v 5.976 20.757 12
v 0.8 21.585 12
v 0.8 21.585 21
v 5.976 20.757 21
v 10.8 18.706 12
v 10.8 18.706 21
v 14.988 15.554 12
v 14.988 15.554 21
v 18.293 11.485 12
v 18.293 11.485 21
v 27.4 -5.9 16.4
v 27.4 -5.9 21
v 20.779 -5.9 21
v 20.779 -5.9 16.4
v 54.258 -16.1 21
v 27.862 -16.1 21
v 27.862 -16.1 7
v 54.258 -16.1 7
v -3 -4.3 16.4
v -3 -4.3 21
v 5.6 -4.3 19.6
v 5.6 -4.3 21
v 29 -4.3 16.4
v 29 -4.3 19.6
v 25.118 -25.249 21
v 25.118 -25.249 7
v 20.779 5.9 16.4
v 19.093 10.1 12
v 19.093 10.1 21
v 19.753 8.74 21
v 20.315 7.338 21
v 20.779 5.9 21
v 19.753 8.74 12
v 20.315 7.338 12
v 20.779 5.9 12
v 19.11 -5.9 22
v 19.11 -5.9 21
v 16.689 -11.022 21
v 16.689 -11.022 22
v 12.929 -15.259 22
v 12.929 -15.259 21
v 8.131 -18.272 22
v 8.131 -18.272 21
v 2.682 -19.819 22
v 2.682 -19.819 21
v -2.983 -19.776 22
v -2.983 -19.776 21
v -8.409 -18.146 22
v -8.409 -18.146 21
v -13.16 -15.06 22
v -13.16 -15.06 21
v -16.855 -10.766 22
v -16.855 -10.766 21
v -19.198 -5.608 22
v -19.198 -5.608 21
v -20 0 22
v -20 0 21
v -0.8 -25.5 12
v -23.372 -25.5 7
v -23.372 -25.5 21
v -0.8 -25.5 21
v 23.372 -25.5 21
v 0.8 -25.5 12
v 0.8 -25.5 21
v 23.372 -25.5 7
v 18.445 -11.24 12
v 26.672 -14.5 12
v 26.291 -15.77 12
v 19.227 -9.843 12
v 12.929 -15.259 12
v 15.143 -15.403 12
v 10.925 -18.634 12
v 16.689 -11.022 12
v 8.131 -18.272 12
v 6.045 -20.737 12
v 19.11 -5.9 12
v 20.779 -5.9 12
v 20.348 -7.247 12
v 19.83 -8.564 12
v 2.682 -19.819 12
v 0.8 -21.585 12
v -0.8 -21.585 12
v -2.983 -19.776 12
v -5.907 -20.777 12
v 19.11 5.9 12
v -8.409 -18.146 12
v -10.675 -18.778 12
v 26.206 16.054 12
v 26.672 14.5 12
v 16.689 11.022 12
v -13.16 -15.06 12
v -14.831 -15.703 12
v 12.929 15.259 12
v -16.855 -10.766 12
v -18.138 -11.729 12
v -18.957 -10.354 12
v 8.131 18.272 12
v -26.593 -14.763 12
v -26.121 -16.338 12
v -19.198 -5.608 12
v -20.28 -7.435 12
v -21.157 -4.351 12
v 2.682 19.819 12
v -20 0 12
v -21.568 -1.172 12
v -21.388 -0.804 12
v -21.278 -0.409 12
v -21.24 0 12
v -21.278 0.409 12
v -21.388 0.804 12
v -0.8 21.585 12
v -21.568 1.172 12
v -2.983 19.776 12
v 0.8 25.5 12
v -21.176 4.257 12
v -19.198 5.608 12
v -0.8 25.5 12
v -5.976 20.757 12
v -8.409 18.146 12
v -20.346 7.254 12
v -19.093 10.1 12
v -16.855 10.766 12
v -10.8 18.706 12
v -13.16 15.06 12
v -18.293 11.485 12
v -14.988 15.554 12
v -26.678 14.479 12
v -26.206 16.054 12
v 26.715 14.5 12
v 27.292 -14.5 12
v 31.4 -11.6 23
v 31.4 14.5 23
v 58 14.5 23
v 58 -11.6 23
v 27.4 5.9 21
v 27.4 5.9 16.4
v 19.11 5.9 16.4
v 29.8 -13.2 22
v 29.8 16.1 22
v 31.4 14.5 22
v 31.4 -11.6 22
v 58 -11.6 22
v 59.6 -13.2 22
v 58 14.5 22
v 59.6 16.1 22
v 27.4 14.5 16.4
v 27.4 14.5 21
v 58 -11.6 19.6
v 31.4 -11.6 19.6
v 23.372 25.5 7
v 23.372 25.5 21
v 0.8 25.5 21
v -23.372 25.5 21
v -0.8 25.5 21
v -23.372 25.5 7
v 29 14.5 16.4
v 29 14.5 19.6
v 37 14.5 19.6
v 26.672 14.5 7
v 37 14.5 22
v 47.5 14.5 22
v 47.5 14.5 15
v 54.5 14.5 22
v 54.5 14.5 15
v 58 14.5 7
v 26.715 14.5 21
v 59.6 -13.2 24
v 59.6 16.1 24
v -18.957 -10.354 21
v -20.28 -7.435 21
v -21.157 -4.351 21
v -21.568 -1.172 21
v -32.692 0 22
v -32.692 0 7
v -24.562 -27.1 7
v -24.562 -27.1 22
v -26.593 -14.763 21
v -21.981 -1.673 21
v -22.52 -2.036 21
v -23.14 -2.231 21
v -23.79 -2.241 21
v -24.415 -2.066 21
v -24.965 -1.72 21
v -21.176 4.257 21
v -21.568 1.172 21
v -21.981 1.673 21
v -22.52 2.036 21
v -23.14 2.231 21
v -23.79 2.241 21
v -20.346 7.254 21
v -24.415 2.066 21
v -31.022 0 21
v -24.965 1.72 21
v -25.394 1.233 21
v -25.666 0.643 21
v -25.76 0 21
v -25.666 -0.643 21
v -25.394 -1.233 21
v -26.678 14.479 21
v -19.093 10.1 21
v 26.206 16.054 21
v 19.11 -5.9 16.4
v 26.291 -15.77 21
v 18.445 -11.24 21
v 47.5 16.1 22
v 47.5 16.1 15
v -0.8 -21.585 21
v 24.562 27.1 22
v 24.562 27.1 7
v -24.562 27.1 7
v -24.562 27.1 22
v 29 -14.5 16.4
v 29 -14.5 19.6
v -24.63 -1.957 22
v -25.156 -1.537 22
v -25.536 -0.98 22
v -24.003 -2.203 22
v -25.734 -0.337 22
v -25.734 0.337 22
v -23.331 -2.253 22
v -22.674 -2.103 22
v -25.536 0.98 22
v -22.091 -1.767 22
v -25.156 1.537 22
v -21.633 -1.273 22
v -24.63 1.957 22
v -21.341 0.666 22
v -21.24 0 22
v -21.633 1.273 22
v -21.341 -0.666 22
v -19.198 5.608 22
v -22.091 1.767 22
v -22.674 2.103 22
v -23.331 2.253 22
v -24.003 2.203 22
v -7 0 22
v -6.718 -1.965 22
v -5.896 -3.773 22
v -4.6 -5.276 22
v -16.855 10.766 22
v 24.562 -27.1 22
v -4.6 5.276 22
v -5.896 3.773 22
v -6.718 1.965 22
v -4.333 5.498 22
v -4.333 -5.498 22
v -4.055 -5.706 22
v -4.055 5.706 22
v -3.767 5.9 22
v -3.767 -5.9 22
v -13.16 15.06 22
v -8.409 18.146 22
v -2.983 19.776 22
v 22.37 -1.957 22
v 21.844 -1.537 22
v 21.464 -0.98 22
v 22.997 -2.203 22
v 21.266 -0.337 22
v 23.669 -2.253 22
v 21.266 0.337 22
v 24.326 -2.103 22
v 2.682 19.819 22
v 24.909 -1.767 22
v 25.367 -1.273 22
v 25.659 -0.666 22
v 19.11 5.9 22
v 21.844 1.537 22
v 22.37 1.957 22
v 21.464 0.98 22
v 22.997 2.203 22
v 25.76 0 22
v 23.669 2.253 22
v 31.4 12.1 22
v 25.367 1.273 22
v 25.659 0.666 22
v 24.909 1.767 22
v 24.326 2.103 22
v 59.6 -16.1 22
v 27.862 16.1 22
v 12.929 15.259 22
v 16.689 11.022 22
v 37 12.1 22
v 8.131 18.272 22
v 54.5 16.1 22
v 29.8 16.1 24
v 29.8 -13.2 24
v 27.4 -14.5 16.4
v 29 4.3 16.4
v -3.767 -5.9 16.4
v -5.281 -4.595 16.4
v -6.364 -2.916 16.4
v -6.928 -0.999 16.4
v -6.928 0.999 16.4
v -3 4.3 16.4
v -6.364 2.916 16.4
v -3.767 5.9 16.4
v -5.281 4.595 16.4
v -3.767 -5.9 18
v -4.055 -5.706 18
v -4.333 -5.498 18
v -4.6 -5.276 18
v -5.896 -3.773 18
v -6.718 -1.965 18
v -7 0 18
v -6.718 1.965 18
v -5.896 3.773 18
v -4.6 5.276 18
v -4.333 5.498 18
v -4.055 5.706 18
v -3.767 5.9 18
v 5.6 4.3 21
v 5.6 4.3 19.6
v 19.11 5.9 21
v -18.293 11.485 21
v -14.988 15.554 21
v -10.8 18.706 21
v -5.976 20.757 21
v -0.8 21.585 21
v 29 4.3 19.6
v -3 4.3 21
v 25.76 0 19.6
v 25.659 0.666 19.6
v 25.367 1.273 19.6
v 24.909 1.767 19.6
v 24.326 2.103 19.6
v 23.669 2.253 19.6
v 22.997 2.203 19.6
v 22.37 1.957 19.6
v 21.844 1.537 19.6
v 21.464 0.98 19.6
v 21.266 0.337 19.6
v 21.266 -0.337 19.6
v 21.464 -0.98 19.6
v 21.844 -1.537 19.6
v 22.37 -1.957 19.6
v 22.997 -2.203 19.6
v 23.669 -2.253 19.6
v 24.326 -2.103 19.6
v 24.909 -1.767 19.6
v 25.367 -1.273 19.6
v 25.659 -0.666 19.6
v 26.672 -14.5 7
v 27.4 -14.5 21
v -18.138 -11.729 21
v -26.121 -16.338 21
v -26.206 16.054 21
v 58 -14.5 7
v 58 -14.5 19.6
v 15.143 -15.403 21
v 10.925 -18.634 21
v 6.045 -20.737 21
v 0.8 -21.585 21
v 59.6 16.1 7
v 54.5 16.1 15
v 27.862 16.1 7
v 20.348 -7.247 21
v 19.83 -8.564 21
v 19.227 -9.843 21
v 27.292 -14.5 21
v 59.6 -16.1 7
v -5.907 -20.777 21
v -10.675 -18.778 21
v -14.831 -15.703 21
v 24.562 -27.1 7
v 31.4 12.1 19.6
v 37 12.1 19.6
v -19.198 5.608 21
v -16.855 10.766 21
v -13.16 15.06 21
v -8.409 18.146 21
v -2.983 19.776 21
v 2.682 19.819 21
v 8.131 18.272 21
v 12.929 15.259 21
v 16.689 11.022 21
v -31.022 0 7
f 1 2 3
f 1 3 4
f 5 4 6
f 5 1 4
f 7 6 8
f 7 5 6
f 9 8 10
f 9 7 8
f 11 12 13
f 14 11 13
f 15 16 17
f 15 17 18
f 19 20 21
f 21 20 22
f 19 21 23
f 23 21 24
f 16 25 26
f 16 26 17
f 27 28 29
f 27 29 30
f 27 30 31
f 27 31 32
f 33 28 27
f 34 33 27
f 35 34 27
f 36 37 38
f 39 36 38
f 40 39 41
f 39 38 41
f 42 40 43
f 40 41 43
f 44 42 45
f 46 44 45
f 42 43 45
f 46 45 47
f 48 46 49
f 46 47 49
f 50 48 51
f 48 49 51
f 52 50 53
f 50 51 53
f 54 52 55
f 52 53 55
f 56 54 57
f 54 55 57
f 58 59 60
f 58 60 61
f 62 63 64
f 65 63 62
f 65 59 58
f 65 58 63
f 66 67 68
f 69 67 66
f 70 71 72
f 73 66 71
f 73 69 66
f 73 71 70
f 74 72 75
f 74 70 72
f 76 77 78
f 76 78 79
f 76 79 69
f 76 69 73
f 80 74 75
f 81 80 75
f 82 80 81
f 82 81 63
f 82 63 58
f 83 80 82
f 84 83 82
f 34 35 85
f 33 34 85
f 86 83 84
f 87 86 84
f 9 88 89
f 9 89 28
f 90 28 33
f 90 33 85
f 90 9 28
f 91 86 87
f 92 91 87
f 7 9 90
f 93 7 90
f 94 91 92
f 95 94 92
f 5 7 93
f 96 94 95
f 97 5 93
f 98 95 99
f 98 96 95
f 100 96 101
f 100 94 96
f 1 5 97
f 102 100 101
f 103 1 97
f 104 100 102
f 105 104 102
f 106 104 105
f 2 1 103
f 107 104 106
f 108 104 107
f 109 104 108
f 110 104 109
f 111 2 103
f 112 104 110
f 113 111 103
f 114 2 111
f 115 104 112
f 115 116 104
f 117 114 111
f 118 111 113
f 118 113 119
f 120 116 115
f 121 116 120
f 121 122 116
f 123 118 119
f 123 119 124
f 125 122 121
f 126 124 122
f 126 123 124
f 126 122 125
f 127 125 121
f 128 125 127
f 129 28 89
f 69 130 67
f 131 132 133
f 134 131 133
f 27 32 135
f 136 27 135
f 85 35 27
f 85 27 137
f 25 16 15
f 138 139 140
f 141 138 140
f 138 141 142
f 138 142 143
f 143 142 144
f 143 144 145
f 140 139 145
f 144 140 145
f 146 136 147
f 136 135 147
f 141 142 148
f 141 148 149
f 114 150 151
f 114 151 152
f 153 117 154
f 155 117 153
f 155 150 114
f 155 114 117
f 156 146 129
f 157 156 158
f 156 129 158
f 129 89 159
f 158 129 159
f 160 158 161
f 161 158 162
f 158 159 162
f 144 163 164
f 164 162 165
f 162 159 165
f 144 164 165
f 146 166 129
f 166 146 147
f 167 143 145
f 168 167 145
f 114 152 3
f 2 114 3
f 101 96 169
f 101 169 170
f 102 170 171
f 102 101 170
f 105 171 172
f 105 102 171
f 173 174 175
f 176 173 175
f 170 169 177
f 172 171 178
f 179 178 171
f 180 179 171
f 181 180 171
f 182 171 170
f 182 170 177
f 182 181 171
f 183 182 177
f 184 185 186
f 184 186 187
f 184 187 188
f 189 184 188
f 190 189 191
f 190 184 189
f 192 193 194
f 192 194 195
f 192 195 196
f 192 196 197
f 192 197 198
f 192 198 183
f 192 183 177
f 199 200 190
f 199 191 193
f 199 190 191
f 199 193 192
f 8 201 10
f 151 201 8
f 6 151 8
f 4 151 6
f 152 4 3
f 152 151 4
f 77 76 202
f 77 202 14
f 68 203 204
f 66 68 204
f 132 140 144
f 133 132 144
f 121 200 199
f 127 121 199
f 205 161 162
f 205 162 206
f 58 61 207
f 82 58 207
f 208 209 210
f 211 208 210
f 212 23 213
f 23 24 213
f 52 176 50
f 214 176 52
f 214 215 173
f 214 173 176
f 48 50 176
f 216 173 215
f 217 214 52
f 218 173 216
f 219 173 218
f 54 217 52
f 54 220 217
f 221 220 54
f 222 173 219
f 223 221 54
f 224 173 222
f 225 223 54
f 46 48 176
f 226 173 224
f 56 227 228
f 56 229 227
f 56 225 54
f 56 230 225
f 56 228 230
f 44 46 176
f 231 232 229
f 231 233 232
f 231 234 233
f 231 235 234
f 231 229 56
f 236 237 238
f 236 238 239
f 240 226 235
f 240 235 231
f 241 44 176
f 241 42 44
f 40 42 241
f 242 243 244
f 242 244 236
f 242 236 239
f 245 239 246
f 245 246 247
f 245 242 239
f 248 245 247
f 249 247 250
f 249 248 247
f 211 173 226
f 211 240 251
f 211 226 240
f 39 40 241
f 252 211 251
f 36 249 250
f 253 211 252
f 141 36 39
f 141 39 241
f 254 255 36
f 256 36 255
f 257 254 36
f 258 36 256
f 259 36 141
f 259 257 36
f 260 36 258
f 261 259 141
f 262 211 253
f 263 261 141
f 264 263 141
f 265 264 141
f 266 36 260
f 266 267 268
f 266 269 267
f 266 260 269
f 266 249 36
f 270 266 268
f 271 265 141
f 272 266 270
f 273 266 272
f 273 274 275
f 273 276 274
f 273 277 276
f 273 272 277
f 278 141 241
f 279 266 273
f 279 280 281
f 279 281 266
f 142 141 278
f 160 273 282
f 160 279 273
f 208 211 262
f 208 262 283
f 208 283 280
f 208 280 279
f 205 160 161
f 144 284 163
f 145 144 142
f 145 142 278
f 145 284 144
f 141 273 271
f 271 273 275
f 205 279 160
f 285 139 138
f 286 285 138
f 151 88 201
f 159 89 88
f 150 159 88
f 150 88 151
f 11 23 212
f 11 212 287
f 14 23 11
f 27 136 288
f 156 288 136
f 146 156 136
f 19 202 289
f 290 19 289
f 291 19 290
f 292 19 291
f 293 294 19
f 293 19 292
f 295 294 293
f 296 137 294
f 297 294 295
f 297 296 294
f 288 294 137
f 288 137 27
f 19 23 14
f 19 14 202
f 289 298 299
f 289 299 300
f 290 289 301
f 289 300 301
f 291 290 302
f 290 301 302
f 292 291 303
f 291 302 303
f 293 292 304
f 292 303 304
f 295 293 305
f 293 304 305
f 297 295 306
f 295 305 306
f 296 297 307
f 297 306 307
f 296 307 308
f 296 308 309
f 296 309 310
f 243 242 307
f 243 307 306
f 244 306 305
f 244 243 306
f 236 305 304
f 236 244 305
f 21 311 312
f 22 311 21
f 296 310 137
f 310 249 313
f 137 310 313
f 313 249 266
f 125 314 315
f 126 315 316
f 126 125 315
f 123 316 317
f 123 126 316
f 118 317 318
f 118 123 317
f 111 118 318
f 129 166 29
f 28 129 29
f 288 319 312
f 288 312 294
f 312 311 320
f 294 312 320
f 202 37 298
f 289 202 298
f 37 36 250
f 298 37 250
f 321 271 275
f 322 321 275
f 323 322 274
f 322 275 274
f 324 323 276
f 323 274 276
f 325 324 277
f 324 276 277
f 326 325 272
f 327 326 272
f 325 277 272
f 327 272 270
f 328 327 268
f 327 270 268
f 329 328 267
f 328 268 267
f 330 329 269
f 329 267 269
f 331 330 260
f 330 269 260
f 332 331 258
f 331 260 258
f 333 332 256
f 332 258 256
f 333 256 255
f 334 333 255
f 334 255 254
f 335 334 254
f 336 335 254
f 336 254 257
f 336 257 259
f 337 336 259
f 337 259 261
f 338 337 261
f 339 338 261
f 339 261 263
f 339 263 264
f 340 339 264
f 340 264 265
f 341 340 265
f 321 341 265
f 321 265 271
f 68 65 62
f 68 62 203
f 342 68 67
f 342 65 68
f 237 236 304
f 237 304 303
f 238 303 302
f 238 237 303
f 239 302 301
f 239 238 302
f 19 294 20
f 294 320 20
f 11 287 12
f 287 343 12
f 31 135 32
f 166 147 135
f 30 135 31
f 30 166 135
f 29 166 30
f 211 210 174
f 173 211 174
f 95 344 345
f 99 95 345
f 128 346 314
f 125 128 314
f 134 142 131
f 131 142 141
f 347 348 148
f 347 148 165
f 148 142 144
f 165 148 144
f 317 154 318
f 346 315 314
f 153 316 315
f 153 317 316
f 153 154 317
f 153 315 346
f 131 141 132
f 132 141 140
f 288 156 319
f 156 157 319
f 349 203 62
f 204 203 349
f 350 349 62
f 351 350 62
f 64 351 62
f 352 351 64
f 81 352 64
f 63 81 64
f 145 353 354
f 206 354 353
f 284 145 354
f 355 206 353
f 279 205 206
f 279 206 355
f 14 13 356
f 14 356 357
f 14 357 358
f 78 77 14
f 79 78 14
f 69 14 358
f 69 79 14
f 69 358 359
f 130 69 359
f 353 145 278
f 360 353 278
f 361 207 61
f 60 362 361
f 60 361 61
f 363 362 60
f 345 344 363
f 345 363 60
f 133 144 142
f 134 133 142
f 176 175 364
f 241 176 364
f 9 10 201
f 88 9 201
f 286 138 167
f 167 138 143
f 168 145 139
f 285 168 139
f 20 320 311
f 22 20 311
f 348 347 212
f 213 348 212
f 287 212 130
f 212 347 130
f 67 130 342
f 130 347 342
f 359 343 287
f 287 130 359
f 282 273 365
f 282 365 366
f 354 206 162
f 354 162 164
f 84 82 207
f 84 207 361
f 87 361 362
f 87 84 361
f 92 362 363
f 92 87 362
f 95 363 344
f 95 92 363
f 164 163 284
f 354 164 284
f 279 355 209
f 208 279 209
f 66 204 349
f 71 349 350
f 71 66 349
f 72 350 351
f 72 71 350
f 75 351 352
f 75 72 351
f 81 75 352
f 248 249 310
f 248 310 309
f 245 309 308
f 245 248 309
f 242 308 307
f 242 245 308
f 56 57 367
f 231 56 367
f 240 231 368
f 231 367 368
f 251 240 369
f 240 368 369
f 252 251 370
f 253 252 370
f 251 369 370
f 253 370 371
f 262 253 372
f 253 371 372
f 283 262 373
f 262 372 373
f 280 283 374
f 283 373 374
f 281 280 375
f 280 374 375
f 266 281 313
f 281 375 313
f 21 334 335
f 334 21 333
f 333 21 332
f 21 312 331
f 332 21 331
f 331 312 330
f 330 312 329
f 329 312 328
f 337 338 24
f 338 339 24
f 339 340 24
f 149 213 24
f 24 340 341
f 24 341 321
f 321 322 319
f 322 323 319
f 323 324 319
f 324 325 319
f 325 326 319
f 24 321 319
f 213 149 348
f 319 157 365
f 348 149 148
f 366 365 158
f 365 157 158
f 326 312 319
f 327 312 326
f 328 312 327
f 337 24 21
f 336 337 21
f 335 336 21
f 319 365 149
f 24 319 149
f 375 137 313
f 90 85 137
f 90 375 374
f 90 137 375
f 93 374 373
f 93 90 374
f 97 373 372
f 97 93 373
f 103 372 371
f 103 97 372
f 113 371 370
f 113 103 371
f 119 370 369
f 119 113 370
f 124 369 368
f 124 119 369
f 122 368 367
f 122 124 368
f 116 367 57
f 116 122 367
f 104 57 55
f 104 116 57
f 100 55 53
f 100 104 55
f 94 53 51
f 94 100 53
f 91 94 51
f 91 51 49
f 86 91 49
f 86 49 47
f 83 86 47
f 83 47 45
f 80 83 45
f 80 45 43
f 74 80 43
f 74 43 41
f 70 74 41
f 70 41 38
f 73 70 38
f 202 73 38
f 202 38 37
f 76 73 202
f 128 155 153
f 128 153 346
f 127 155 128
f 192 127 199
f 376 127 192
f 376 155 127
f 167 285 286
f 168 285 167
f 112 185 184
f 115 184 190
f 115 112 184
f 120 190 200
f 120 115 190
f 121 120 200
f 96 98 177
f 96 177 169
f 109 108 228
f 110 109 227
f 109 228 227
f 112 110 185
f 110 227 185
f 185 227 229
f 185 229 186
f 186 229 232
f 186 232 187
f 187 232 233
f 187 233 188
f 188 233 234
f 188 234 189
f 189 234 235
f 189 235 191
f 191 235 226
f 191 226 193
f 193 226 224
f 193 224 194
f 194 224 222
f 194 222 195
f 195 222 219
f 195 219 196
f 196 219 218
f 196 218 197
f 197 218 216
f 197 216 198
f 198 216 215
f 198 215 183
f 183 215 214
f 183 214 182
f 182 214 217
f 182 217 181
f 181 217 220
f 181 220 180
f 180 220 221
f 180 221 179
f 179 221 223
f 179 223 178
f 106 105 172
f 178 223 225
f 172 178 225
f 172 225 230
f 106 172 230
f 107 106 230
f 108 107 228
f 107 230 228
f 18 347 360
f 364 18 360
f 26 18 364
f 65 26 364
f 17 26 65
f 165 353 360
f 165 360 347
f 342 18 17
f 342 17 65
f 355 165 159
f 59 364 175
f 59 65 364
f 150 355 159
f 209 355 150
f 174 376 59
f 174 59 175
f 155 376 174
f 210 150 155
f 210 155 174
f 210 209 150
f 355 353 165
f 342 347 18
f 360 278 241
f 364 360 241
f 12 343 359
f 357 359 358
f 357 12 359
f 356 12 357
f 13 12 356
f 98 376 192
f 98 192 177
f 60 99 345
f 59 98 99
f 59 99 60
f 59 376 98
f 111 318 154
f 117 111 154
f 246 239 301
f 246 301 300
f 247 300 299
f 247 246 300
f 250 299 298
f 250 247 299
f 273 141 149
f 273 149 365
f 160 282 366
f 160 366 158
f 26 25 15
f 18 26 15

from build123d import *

# Parameters (mm, degrees)
BOSS_EXTRUDE1_DEPTH      = 10
BOSS_EXTRUDE1_DEPTH_BACK = 5
BOSS_EXTRUDE2_DEPTH      = 15
CUT_EXTRUDE1_DEPTH       = 68.168221653
BOSS_EXTRUDE3_DEPTH      = 4
SKETCH7_R                = 1.75
BOSS_EXTRUDE4_DEPTH      = 2.4
SKETCH8_R                = 3.5
BOSS_EXTRUDE5_DEPTH      = 1
CUT_EXTRUDE2_DEPTH       = 10
BOSS_EXTRUDE7_START      = 14
BOSS_EXTRUDE7_DEPTH      = 14
RIB9_START               = -9
RIB9_DEPTH               = 9
CUT_EXTRUDE3_DEPTH       = 5
SKETCH18_R               = 2.259673145
CUT_EXTRUDE4_DEPTH       = 68.168221653
SKETCH20_R               = 3.5
SKETCH20_W               = 8.6
SKETCH20_H               = 8.6
BOSS_EXTRUDE8_DEPTH      = 1
SKETCH21_W               = 7
SKETCH21_H               = 1.6
CUT_EXTRUDE5_DEPTH       = 7
BOSS_EXTRUDE9_DEPTH      = 1
BOSS_EXTRUDE10_DEPTH     = 14
BOSS_EXTRUDE11_DEPTH     = 2
SKETCH25_W               = 26.6
SKETCH25_H               = 26.1
BOSS_EXTRUDE12_DEPTH     = 1
BOSS_EXTRUDE13_DEPTH     = 4
CUT_EXTRUDE6_START       = -4
CUT_EXTRUDE6_DEPTH       = 4
BOSS_EXTRUDE14_DEPTH     = 1.6


# Read off the part's stored shape, not the designer's step: Rib9
with BuildPart() as part:
    # Sketch2 → Boss-Extrude1 (new, two sides: drawn at the far end of the back side and taken through both)
    with BuildSketch(Plane.XY.offset(12).offset(-BOSS_EXTRUDE1_DEPTH_BACK)):
        Polygon((-24.562464367, 27.1), (-32.692464367, 0), (-24.562464367, -27.1), (24.562464367, -27.1), (32.692464367, 0), (24.562464367, 27.1), align=None)
        Polygon((-23.372015325, 25.5), (-31.022015325, 0), (-23.372015325, -25.5), (23.372015325, -25.5), (31.022015325, 0), (23.372015325, 25.5), align=None, mode=Mode.SUBTRACT)
    extrude(amount=BOSS_EXTRUDE1_DEPTH + BOSS_EXTRUDE1_DEPTH_BACK)

    # Sketch3 → Boss-Extrude2 (add)
    with BuildSketch(Plane.XY.offset(22)):
        Polygon((29.5, 16.1), (59.6, 16.1), (59.6, -16.1), (29.5, -16.1), (27.862464367, -16.1), (28.342464367, -14.5), (29.5, -14.5), (58, -14.5), (58, 14.5), (29.5, 14.5), (28.342464367, 14.5), (27.862464367, 16.1), align=None)
    extrude(amount=-BOSS_EXTRUDE2_DEPTH)

    # Sketch4 → Cut-Extrude1 (cut, through all)
    with BuildSketch(Plane(origin=(0, 0, 7), x_dir=(-1, 0, 0), z_dir=(0, 0, -1))):
        Polygon((-26.672015325, 14.5), (-28.342464367, 14.5), (-32.692464367, 0), (-28.342464367, -14.5), (-26.672015325, -14.5), (-31.022015325, 0), align=None)
    extrude(amount=-CUT_EXTRUDE1_DEPTH, mode=Mode.SUBTRACT)

    # Sketch5 → Boss-Extrude3 (add)
    with BuildSketch(Plane.XY.offset(22)):
        Polygon((29, 4.3), (29, 14), (29, 14.5), (27.4, 14.5), (27.4, 14), (27.4, 5.9), (-4.6, 5.9), (-4.6, -5.9), (27.4, -5.9), (27.4, -14), (27.4, -14.5), (29, -14.5), (29, -14), (29, -4.3), (-3, -4.3), (-3, 4.3), align=None)
    extrude(amount=-BOSS_EXTRUDE3_DEPTH)

    # Sketch7 → Boss-Extrude4 (add)
    with BuildSketch(Plane.XY.offset(22)):
        Polygon((37, 12.1), (37, 14.5), (29, 14.5), (29, 4.3), (5.6, 4.3), (5.6, -4.3), (29, -4.3), (29, -14.5), (58, -14.5), (58, -11.6), (31.4, -11.6), (31.4, 12.1), align=None)
        with Locations((23.5, 0)):
            Circle(SKETCH7_R, mode=Mode.SUBTRACT)
    extrude(amount=-BOSS_EXTRUDE4_DEPTH)

    # Sketch8 → Boss-Extrude5 (add)
    with BuildSketch(Plane.XY.offset(22)):
        Polygon((27.4, -5.9), (27.4, -14.5), (26.672015325, -14.5), (23.372015325, -25.5), (-23.372015325, -25.5), (-31.022015325, 0), (-23.372015325, 25.5), (23.372015325, 25.5), (26.672015325, 14.5), (27.4, 14.5), (27.4, 5.9), (-4.6, 5.9), (-4.6, -5.9), align=None)
        with Locations((-18.25, 18.25)):
            Circle(SKETCH8_R, mode=Mode.SUBTRACT)
        with Locations((18.25, 18.25)):
            Circle(SKETCH8_R, mode=Mode.SUBTRACT)
        with Locations((18.25, -18.25)):
            Circle(SKETCH8_R, mode=Mode.SUBTRACT)
        with Locations((-18.25, -18.25)):
            Circle(SKETCH8_R, mode=Mode.SUBTRACT)
    extrude(amount=-BOSS_EXTRUDE5_DEPTH)

    # Sketch11 → Cut-Extrude2 (cut)
    with BuildSketch(Plane(origin=(0, 0, 21), x_dir=(-1, 0, 0), z_dir=(0, 0, -1))):
        with BuildLine():
            Line((4.6, -5.9), (-19.109945055, -5.9))
            ThreePointArc((-19.109945055, -5.9), (2.983378865, -19.776234489), (20, 0))
            ThreePointArc((20, 0), (2.983378865, 19.776234489), (-19.109945055, 5.9))
            Line((-19.109945055, 5.9), (4.6, 5.9))
            Line((4.6, 5.9), (4.6, -5.9))
        make_face()
    extrude(amount=-CUT_EXTRUDE2_DEPTH, mode=Mode.SUBTRACT)

    # Sketch12 → Boss-Extrude7 (add)
    with BuildSketch(Plane(origin=(0, 0, 21), x_dir=(-1, 0, 0), z_dir=(0, 0, -1)).offset(BOSS_EXTRUDE7_START)):
        with BuildLine():
            ThreePointArc((21.6, 0), (2.978452055, 21.393663159), (-20.778594755, 5.9))
            Line((-20.778594755, 5.9), (-19.109945055, 5.9))
            ThreePointArc((-19.109945055, 5.9), (20, 0), (-19.109945055, -5.9))
            Line((-19.109945055, -5.9), (-20.778594755, -5.9))
            ThreePointArc((-20.778594755, -5.9), (2.978452055, -21.393663159), (21.6, 0))
        make_face()
    extrude(amount=-BOSS_EXTRUDE7_DEPTH)

    # Rib9 outline → Rib9 (add)
    with BuildSketch(Plane(origin=(0, 0, 12), x_dir=(-1, 0, 0), z_dir=(0, 0, -1)).offset(RIB9_START)):
        with BuildLine():
            ThreePointArc((-0.8, 21.585180101), (0, 21.6), (0.8, 21.585180101))
            Line((0.8, 21.585180101), (0.8, 25.5))
            Line((0.8, 25.5), (-0.8, 25.5))
            Line((-0.8, 25.5), (-0.8, 21.585180101))
        make_face()
        with BuildLine():
            Line((26.205893326, 16.053739997), (18.293314313, 11.485410374))
            ThreePointArc((18.293314313, 11.485410374), (18.706148722, 10.8), (19.093314313, 10.099769728))
            Line((19.093314313, 10.099769728), (26.678322459, 14.478976222))
            Line((26.678322459, 14.478976222), (26.205893326, 16.053739997))
        make_face()
        with BuildLine():
            ThreePointArc((-19.093314313, 10.099769728), (-18.706148721, 10.8), (-18.293314313, 11.485410374))
            Line((-18.293314313, 11.485410374), (-26.205893326, 16.053739997))
            Line((-26.205893326, 16.053739997), (-26.672015325, 14.5))
            Line((-26.672015325, 14.5), (-26.71473671, 14.5))
            Line((-26.71473671, 14.5), (-19.093314313, 10.099769728))
        make_face()
        with BuildLine():
            Line((26.593085869, -14.763098188), (18.9565691, -10.354153175))
            ThreePointArc((18.9565691, -10.354153175), (18.560039094, -11.049205801), (18.138036207, -11.729093851))
            Line((18.138036207, -11.729093851), (26.120656737, -16.337861962))
            Line((26.120656737, -16.337861962), (26.593085869, -14.763098188))
        make_face()
        with BuildLine():
            Line((0.8, -25.5), (0.8, -21.585180101))
            ThreePointArc((0.8, -21.585180101), (0, -21.6), (-0.8, -21.585180101))
            Line((-0.8, -21.585180101), (-0.8, -25.5))
            Line((-0.8, -25.5), (0.8, -25.5))
        make_face()
        with BuildLine():
            Line((-26.291129916, -15.769618032), (-18.445244234, -11.239793821))
            ThreePointArc((-18.445244234, -11.239793821), (-18.848912462, -10.548862451), (-19.226711341, -9.843453205))
            Line((-19.226711341, -9.843453205), (-27.292086979, -14.5))
            Line((-27.292086979, -14.5), (-26.672015325, -14.5))
            Line((-26.672015325, -14.5), (-26.291129916, -15.769618032))
        make_face()
    extrude(amount=RIB9_DEPTH)

    # Sketch17 → Cut-Extrude3 (cut)
    with BuildSketch(Plane(origin=(0, 0, 7), x_dir=(-1, 0, 0), z_dir=(0, 0, -1))):
        with BuildLine():
            Line((-19.109945055, -5.9), (-20.778594755, -5.9))
            ThreePointArc((-20.778594755, -5.9), (21.6, 0), (-20.778594755, 5.9))
            Line((-20.778594755, 5.9), (-19.109945055, 5.9))
            ThreePointArc((-19.109945055, 5.9), (20, 0), (-19.109945055, -5.9))
        make_face()
    extrude(amount=-CUT_EXTRUDE3_DEPTH, mode=Mode.SUBTRACT)

    # Sketch18 → Cut-Extrude4 (cut, through all)
    with BuildSketch(Plane.XY.offset(22)):
        with Locations((-23.5, 0)):
            Circle(SKETCH18_R)
        with Locations((23.5, 0)):
            Circle(SKETCH18_R)
    extrude(amount=-CUT_EXTRUDE4_DEPTH, mode=Mode.SUBTRACT)

    # Sketch20 → Boss-Extrude8 (add)
    with BuildSketch(Plane.XY.offset(22)):
        with Locations((18.25, 18.25)):
            Circle(SKETCH20_R)
        with Locations((18.25, -18.25)):
            Circle(SKETCH20_R)
        with Locations((-18.25, -18.25)):
            Circle(SKETCH20_R)
        with Locations((-18.25, 18.25)):
            Circle(SKETCH20_R)
        with Locations((1.3, 0)):
            Rectangle(SKETCH20_W, SKETCH20_H)
    extrude(amount=-BOSS_EXTRUDE8_DEPTH)

    # Sketch21 → Cut-Extrude5 (cut)
    with BuildSketch(Plane.XY.offset(22)):
        with Locations((51, 15.3)):
            Rectangle(SKETCH21_W, SKETCH21_H)
    extrude(amount=-CUT_EXTRUDE5_DEPTH, mode=Mode.SUBTRACT)

    # Sketch22 → Boss-Extrude9 (add)
    with BuildSketch(Plane.XY.offset(22)):
        Polygon((24.562464367, -27.1), (59.6, -16.1), (27.862464367, -16.1), align=None)
    extrude(amount=-BOSS_EXTRUDE9_DEPTH)

    # Sketch23 → Boss-Extrude10 (add)
    with BuildSketch(Plane(origin=(0, 0, 21), x_dir=(-1, 0, 0), z_dir=(0, 0, -1))):
        Polygon((-25.117875099, -25.248630892), (-54.258373362, -16.1), (-59.6, -16.1), (-24.562464367, -27.1), align=None)
    extrude(amount=BOSS_EXTRUDE10_DEPTH)

    # Sketch26 → Boss-Extrude13 (add)
    with BuildSketch(Plane.XY.offset(22)):
        with BuildLine():
            ThreePointArc((-7, 0), (-6.371812929, -2.898275349), (-4.6, -5.276362383))
            Line((-4.6, -5.276362383), (-4.6, 0))
            Line((-4.6, 0), (-7, 0))
        make_face()
        with BuildLine():
            Line((-7, 0), (-4.6, 0))
            Line((-4.6, 0), (-4.6, 5.276362383))
            ThreePointArc((-4.6, 5.276362383), (-6.371812929, 2.898275349), (-7, 0))
        make_face()
    extrude(amount=-BOSS_EXTRUDE13_DEPTH)

    # Sketch28 → Cut-Extrude6 (cut)
    with BuildSketch(Plane(origin=(0, 0, 18), x_dir=(-1, 0, 0), z_dir=(0, 0, -1)).offset(CUT_EXTRUDE6_START)):
        with BuildLine():
            ThreePointArc((3.76696164, 5.9), (4.195085546, 5.603682473), (4.6, 5.276362383))
            Line((4.6, 5.276362383), (4.6, 5.9))
            Line((4.6, 5.9), (3.76696164, 5.9))
        make_face()
        with BuildLine():
            Line((3.76696164, -5.9), (4.6, -5.9))
            Line((4.6, -5.9), (4.6, -5.276362383))
            ThreePointArc((4.6, -5.276362383), (4.195085546, -5.603682473), (3.76696164, -5.9))
        make_face()
    extrude(amount=CUT_EXTRUDE6_DEPTH, mode=Mode.SUBTRACT)

    # Sketch29 → Boss-Extrude14 (add)
    with BuildSketch(Plane(origin=(0, 0, 18), x_dir=(-1, 0, 0), z_dir=(0, 0, -1))):
        with BuildLine():
            Line((3.76696164, 5.9), (-19.109945055, 5.9))
            Line((-19.109945055, 5.9), (-20.778594755, 5.9))
            Line((-20.778594755, 5.9), (-27.4, 5.9))
            Line((-27.4, 5.9), (-27.4, 14.5))
            Line((-27.4, 14.5), (-29, 14.5))
            Line((-29, 14.5), (-29, 4.3))
            Line((-29, 4.3), (3, 4.3))
            Line((3, 4.3), (3, -4.3))
            Line((3, -4.3), (-29, -4.3))
            Line((-29, -4.3), (-29, -14.5))
            Line((-29, -14.5), (-27.4, -14.5))
            Line((-27.4, -14.5), (-27.4, -5.9))
            Line((-27.4, -5.9), (-20.778594755, -5.9))
            Line((-20.778594755, -5.9), (-19.109945055, -5.9))
            Line((-19.109945055, -5.9), (3.76696164, -5.9))
            ThreePointArc((3.76696164, -5.9), (7, 0), (3.76696164, 5.9))
        make_face()
    extrude(amount=BOSS_EXTRUDE14_DEPTH)


with BuildPart() as body_2:
    # Sketch24 → Boss-Extrude11 (new body)
    with BuildSketch(Plane.XY.offset(22)):
        Polygon((59.6, 16.1), (29.8, 16.1), (29.8, 12.1), (29.8, -13.2), (59.6, -13.2), align=None)
        Polygon((58, 14.5), (58, -11.6), (31.4, -11.6), (31.4, 12.1), (31.4, 14.5), align=None, mode=Mode.SUBTRACT)
    extrude(amount=BOSS_EXTRUDE11_DEPTH)

    # Sketch25 → Boss-Extrude12 (add)
    with BuildSketch(Plane.XY.offset(24)):
        with Locations((44.7, 1.45)):
            Rectangle(SKETCH25_W, SKETCH25_H)
    extrude(amount=-BOSS_EXTRUDE12_DEPTH)


solid = Compound([part.part, body_2.part])
